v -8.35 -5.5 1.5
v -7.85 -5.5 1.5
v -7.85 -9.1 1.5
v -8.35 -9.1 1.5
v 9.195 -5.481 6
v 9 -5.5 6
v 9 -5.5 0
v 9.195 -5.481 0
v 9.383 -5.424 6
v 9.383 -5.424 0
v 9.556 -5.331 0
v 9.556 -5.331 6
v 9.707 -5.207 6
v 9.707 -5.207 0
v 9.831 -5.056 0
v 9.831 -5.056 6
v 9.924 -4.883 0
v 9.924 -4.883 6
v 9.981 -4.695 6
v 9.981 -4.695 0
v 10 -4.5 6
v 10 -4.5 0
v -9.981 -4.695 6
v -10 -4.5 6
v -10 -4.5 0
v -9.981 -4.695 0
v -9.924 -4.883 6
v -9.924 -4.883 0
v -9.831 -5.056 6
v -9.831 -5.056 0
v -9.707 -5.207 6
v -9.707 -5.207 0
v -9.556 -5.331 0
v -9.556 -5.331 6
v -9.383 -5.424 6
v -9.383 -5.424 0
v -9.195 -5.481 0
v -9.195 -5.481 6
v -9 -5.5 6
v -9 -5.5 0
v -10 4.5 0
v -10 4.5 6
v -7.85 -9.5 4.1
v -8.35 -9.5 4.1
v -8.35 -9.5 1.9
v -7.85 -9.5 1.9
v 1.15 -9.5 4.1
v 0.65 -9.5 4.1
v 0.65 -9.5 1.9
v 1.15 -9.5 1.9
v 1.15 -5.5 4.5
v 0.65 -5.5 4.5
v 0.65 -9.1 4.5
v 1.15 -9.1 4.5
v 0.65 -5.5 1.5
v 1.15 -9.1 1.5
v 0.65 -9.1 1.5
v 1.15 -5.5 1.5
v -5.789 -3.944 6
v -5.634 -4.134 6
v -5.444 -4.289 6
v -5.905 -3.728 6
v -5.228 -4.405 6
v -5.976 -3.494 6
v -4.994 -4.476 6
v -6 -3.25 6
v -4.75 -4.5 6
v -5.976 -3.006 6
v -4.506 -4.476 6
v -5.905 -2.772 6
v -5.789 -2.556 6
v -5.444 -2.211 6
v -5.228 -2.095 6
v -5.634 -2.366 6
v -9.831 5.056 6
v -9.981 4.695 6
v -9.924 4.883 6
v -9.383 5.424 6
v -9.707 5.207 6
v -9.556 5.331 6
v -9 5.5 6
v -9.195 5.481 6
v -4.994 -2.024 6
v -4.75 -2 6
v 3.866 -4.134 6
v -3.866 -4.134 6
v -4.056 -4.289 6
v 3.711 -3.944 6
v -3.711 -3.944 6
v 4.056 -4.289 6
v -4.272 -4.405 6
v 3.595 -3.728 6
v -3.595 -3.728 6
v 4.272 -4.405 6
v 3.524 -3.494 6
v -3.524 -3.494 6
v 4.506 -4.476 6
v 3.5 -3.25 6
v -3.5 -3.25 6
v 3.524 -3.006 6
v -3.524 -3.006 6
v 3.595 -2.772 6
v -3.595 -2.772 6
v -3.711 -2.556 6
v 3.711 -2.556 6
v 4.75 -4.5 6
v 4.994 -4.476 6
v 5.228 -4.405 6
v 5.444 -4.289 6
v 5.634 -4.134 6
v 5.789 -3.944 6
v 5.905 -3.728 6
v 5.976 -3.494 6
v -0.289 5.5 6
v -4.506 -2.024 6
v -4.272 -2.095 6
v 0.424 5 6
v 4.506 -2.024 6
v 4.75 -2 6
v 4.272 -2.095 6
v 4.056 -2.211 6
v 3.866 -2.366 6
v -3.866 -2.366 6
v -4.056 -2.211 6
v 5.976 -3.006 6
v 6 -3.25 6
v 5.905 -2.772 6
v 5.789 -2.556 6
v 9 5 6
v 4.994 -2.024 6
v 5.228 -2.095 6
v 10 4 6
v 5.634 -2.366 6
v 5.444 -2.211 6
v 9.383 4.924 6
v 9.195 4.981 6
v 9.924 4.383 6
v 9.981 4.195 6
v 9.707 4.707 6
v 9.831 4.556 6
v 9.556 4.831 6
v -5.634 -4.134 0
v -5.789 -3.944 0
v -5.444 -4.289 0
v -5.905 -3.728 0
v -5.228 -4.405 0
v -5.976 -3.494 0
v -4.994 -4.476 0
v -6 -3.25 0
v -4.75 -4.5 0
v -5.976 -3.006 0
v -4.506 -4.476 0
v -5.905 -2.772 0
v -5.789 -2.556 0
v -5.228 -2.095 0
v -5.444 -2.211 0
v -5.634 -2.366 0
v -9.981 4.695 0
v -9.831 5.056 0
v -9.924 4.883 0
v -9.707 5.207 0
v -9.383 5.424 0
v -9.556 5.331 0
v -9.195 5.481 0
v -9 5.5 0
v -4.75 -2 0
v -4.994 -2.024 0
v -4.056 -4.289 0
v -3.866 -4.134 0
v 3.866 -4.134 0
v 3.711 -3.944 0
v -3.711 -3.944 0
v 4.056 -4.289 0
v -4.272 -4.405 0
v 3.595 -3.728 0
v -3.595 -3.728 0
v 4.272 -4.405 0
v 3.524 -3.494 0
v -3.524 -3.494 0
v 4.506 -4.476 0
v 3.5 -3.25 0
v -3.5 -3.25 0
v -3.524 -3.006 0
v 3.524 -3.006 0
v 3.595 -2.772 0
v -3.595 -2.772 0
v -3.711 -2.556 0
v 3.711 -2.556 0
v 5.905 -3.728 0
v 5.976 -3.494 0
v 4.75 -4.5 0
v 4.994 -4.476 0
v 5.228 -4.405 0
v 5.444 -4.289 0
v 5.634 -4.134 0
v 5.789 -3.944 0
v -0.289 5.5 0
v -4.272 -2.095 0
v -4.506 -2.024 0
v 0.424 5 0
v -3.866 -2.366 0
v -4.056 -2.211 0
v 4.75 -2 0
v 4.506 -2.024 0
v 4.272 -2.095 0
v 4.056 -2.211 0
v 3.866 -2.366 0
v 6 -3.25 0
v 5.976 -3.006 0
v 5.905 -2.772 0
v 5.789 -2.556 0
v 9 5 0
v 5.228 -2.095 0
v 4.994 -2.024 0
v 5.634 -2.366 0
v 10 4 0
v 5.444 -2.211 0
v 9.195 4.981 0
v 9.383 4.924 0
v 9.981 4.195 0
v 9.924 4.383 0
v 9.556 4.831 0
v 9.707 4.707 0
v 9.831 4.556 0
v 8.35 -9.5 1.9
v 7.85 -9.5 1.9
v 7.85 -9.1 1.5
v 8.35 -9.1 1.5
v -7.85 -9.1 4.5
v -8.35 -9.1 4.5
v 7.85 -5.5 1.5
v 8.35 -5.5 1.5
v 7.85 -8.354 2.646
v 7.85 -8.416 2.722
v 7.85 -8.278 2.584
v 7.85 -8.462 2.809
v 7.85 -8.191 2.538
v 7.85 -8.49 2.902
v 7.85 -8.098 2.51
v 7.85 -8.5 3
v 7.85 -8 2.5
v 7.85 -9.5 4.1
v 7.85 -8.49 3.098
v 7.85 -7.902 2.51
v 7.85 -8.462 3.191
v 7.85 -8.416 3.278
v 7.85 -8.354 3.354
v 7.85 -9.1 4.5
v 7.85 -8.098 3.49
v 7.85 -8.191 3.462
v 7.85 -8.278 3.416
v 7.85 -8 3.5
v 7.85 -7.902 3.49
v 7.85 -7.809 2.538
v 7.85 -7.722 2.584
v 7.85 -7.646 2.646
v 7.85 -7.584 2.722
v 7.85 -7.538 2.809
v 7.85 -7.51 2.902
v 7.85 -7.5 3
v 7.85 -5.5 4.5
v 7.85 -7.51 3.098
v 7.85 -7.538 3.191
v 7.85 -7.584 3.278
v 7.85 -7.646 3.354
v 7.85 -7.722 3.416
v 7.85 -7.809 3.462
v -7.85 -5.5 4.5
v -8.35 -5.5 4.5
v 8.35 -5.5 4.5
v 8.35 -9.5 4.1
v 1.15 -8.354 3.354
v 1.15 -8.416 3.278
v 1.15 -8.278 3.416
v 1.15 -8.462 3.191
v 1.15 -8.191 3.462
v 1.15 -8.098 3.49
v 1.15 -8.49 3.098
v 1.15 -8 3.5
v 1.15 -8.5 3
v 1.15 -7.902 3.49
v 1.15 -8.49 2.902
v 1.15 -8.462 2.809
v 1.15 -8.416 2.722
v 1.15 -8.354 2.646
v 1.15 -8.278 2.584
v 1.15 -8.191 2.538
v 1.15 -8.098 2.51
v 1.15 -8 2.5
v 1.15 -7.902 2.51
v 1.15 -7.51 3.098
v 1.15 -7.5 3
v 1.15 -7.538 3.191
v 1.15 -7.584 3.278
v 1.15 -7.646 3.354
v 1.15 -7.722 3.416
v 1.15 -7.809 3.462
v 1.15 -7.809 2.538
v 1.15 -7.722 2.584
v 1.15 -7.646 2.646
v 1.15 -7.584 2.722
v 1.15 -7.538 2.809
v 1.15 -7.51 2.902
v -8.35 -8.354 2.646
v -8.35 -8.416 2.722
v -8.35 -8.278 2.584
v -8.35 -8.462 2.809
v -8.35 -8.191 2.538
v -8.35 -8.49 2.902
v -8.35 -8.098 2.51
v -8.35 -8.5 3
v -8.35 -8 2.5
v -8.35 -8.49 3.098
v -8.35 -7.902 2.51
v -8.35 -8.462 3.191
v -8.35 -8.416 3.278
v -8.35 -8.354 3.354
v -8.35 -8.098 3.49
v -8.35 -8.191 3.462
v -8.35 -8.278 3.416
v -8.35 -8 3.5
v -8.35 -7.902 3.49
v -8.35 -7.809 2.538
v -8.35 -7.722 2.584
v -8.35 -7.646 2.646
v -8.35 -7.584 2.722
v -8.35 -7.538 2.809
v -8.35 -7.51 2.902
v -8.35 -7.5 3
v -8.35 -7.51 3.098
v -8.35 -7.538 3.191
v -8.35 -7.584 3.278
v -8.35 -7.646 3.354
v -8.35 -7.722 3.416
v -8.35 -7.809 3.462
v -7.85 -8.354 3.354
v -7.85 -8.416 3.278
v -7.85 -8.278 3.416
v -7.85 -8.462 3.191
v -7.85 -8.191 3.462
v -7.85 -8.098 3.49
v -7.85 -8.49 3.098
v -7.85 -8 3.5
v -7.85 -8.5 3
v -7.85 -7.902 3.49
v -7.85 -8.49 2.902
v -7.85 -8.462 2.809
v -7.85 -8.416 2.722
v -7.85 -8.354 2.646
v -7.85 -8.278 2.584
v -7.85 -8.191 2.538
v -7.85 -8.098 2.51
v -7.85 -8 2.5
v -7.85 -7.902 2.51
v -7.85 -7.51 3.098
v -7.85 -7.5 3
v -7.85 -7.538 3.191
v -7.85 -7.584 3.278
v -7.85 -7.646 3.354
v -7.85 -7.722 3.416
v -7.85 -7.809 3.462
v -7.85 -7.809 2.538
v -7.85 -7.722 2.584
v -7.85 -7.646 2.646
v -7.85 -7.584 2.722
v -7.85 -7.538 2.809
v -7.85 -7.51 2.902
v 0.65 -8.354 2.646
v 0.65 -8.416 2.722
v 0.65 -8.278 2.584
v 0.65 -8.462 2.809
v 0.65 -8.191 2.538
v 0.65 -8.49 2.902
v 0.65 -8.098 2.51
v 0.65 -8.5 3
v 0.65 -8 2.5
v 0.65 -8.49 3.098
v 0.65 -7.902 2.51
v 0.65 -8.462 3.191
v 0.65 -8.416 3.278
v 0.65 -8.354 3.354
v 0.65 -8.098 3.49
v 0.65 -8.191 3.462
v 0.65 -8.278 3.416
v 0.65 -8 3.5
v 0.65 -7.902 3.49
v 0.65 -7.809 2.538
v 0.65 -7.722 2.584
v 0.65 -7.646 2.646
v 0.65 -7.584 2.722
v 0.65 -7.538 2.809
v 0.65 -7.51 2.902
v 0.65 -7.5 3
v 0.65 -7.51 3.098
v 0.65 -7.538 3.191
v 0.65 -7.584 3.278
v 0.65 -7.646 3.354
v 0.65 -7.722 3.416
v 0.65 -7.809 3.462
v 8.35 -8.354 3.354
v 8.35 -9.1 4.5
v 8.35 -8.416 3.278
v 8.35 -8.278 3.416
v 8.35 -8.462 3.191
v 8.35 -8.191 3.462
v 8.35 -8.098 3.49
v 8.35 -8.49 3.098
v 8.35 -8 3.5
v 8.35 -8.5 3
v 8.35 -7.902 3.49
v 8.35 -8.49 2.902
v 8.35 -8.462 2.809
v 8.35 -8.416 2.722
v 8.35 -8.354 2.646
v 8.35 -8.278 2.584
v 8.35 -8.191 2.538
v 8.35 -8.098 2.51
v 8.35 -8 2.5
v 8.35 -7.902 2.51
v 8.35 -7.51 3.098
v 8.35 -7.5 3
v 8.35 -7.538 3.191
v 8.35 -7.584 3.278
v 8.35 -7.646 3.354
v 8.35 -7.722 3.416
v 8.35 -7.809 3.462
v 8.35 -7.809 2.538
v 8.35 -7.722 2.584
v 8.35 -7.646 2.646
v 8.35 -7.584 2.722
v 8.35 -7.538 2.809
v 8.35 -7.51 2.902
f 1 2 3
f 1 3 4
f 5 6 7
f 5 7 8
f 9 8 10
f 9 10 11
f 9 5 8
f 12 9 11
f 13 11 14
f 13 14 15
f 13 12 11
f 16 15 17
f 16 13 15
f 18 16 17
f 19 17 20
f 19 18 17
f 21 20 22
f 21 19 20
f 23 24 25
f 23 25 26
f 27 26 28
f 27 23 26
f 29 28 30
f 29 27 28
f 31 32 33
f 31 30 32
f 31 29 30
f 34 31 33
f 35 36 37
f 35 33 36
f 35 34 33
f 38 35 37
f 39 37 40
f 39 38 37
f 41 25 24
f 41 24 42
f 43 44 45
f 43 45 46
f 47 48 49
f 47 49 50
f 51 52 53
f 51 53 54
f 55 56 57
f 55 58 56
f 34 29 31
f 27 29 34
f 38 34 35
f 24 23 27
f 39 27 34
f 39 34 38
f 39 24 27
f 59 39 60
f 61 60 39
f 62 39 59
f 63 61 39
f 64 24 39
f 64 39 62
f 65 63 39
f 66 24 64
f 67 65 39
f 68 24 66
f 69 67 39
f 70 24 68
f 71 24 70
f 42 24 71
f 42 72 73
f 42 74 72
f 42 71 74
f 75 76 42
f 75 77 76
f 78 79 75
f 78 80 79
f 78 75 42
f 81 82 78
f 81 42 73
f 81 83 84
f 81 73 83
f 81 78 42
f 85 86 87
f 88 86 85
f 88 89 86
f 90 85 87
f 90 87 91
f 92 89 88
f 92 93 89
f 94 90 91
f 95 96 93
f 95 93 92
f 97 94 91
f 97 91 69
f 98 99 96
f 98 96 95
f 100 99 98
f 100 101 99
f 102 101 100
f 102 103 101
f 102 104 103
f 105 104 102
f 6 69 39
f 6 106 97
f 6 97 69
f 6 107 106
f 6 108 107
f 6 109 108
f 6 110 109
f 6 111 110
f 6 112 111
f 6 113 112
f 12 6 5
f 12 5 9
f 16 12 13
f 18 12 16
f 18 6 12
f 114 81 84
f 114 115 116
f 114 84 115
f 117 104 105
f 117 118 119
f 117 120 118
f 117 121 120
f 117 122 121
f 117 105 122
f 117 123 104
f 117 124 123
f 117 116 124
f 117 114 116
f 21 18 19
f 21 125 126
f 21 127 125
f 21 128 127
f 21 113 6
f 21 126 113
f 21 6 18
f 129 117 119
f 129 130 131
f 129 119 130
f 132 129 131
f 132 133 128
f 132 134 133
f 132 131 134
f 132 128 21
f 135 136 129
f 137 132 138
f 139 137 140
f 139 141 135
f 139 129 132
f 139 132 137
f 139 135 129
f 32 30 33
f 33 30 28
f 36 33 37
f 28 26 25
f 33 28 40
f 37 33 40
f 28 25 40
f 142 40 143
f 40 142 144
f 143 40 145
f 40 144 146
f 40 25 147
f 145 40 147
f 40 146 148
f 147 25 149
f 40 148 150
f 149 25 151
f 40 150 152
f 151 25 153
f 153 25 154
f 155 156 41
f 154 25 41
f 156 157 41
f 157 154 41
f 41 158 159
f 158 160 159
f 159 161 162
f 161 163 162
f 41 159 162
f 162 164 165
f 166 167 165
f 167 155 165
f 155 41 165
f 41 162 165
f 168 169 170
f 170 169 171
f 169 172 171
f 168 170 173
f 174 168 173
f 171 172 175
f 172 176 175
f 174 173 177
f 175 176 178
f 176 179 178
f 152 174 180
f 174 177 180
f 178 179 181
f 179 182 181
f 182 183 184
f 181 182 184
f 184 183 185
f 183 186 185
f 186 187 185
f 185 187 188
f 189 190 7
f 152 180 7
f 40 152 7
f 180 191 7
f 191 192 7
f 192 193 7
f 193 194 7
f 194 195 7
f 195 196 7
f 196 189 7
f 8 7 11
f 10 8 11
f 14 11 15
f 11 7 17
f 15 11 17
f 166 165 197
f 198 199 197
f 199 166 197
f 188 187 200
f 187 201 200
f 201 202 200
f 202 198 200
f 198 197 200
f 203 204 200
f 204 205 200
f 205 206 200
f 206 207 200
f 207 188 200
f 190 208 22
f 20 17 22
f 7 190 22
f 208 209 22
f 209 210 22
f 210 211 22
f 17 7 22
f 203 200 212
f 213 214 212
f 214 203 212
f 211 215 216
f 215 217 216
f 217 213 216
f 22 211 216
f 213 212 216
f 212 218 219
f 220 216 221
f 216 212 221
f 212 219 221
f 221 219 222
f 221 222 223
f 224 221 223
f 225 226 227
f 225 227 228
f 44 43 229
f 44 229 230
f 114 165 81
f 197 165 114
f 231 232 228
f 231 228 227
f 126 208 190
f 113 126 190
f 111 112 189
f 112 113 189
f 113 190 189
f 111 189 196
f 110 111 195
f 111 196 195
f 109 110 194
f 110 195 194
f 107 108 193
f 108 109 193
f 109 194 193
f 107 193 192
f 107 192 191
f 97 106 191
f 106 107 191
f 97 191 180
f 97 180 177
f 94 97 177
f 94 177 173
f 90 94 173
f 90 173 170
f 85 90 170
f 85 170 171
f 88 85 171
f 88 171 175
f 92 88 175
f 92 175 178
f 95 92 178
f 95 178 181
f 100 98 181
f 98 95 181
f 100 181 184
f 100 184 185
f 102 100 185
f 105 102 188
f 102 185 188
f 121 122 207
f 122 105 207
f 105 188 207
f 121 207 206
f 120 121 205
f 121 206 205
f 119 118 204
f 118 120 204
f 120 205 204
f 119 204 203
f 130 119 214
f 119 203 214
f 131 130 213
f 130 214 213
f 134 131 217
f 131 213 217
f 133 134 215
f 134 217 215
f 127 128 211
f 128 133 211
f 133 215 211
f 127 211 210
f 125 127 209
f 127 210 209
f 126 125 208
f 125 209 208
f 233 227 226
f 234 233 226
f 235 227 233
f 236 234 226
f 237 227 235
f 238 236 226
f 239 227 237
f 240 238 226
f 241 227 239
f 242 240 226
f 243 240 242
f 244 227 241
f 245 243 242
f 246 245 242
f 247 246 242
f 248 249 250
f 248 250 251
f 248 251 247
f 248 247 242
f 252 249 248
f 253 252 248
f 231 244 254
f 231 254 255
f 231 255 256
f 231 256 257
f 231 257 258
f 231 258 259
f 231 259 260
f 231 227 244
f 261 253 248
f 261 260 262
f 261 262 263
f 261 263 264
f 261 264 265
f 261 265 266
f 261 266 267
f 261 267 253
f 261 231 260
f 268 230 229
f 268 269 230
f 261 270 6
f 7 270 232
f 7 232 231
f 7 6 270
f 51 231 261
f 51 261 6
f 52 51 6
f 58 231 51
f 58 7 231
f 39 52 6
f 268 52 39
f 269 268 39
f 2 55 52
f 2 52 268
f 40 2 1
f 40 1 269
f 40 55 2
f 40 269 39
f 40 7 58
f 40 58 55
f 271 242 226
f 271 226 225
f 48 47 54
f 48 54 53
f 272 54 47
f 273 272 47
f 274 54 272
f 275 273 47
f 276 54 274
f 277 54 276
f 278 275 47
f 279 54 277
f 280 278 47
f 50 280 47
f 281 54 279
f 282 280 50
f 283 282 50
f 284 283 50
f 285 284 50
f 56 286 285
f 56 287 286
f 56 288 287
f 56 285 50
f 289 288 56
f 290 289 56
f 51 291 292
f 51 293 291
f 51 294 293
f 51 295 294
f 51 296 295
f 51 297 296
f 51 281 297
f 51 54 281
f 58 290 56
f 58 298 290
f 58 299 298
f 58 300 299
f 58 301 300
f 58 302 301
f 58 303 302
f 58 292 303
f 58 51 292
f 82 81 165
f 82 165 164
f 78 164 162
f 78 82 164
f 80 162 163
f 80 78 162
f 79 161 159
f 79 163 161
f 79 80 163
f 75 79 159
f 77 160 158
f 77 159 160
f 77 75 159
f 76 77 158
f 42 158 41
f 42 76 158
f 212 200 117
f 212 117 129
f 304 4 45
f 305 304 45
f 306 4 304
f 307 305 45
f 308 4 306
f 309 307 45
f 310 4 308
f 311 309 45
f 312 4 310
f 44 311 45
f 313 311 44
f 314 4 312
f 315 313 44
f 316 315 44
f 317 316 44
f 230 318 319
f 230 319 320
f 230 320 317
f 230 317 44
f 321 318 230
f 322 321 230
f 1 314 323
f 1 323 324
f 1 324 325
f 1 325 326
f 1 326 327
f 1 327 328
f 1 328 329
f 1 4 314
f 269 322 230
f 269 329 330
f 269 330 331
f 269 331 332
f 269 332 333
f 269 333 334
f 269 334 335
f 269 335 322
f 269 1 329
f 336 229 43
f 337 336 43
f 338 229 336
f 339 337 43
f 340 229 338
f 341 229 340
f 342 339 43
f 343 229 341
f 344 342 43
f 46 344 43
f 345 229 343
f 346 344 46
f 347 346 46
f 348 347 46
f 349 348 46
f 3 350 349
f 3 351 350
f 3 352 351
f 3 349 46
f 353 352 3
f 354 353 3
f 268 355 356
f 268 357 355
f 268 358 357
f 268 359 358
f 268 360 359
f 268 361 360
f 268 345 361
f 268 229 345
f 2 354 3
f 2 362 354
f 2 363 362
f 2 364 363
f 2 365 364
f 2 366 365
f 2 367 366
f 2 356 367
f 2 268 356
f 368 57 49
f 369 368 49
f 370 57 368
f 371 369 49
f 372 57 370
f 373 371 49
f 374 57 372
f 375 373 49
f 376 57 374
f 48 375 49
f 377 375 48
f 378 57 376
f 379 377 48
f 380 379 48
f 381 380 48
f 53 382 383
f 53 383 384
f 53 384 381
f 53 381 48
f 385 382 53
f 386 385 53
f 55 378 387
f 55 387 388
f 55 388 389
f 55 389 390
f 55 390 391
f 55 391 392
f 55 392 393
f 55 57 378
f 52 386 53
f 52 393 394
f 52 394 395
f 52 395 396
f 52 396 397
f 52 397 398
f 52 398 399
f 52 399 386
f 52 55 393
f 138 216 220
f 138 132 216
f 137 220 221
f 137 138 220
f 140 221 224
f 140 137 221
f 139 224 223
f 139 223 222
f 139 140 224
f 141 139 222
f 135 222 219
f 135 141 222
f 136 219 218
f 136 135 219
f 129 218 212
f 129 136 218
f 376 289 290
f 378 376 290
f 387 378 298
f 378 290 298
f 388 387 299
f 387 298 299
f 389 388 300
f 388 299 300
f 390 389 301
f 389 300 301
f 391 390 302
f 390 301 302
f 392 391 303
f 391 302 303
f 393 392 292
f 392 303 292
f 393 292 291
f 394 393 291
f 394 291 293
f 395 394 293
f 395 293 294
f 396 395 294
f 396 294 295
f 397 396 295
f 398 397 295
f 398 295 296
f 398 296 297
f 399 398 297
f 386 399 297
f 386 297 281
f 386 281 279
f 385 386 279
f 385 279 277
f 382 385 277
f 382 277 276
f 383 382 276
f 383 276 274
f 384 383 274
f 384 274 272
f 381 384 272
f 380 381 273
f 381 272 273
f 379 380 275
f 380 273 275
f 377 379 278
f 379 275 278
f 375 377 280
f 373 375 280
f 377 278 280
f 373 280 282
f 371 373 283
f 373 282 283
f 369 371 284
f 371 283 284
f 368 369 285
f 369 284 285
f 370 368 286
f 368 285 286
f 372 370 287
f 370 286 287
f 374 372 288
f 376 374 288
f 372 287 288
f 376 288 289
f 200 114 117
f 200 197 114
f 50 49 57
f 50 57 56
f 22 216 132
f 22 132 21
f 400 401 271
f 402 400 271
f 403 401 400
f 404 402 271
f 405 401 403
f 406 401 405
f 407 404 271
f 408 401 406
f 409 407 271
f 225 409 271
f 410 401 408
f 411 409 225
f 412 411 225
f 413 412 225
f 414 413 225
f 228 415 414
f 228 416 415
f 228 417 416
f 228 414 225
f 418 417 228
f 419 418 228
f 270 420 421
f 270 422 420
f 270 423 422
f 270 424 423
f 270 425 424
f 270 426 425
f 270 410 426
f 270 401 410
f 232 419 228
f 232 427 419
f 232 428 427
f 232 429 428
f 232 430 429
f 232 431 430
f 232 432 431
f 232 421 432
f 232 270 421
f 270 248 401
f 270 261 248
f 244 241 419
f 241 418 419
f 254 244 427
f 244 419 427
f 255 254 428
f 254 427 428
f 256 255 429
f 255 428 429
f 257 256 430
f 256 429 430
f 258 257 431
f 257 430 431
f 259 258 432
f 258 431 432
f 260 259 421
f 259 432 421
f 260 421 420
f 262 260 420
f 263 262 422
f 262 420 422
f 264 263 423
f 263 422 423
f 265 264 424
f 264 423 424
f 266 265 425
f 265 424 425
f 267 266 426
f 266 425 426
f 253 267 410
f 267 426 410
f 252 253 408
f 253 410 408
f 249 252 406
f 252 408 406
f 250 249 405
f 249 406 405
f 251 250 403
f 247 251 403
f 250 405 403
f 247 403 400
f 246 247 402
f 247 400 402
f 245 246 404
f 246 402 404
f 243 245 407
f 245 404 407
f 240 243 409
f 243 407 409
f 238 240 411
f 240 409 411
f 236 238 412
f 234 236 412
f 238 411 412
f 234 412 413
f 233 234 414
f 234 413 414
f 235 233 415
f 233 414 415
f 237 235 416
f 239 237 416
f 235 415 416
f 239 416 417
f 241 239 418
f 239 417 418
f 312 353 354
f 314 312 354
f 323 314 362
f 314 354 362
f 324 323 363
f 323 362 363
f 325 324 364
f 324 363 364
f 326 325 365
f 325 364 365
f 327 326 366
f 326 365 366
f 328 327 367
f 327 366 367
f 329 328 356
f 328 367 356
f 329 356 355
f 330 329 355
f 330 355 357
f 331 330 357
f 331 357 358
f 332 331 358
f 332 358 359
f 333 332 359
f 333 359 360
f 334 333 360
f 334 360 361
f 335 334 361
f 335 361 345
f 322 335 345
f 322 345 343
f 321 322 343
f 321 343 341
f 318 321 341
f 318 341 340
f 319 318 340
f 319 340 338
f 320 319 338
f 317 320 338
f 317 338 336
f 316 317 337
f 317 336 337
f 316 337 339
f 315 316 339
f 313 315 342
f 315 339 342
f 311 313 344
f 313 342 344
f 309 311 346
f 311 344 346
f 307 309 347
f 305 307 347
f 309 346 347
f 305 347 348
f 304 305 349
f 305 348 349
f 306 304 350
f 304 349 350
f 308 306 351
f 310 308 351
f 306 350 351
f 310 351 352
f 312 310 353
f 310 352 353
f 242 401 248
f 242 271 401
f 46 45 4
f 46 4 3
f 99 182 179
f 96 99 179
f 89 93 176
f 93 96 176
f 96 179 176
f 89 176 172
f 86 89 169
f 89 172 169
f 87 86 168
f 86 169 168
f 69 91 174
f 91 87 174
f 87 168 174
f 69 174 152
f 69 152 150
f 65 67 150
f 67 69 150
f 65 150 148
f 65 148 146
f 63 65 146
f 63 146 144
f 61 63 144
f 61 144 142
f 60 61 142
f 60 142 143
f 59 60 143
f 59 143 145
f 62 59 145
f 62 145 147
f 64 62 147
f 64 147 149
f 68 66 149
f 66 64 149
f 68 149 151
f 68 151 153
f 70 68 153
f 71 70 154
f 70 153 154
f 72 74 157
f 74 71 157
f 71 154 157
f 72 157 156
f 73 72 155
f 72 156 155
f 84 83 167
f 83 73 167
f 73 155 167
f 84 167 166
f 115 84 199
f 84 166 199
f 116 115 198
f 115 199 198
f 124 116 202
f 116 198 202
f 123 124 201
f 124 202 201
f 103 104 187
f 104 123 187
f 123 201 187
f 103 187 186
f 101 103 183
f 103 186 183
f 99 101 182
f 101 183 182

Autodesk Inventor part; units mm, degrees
ref_plane "YZ Plane" through (0, 0, 0) normal (1, 0, 0) x (0, 1, 0)
ref_plane "XZ Plane" through (0, 0, 0) normal (0, 1, 0) x (-1, 0, 0)
ref_plane "XY Plane" through (0, 0, 0) normal (0, 0, 1) x (1, 0, 0)
sketch "Sketch1" plane through (0, 0, 0) normal (0, 0, 1) x (1, 0, 0)
  line L0 (-10, 5.5) -> (-0.289, 5.5)
  line L1 (10, 5) -> (10, -5.5)
  line L2 (10, -5.5) -> (-10, -5.5)
  line L3 (-10, -5.5) -> (-10, 5.5)
  line L4 (-0.289, 5.5) -> (0.4244, 5)
  line L5 (0.4244, 5) -> (10, 5)
  line L6 (-10, 5.5) -> (10, -5.5) construction
  circle A0 centre (4.75, -3.25) radius 1.25
  line L7 (0, -5.5) -> (0, 3.5475) construction
  circle A1 centre (-4.75, -3.25) radius 1.25
  point P0 (0, 0)
  point P1 (0, 0)
  point P2 (0, 0)
  dimension "d3" = 20
  dimension "d4" = 11
  dimension "d5" = 10.5
  dimension "d6" = 0.7134
  dimension "d7" = 2.5
  dimension "d8" = 2.25
  dimension "d9" = 5.25
extrude "Extrusion1" add sketch "Sketch1" along normal blind 6
sketch "Sketch2" plane through (-10, -5.5, 0) normal (0, -1, 0) x (1, 0, 0)
  line L0 (1.65, 4.5) -> (2.15, 4.5)
  line L1 (2.15, 4.5) -> (2.15, 1.5)
  line L2 (2.15, 1.5) -> (1.65, 1.5)
  line L3 (1.65, 1.5) -> (1.65, 4.5)
  line L4 (10.65, 4.5) -> (11.15, 4.5)
  line L5 (11.15, 4.5) -> (11.15, 1.5)
  line L6 (11.15, 1.5) -> (10.65, 1.5)
  line L7 (10.65, 1.5) -> (10.65, 4.5)
  line L8 (17.85, 4.5) -> (18.35, 4.5)
  line L9 (18.35, 4.5) -> (18.35, 1.5)
  line L10 (18.35, 1.5) -> (17.85, 1.5)
  line L11 (17.85, 1.5) -> (17.85, 4.5)
  line L12 (0, 0) -> (0, 6) projected
  line L13 (0, 0) -> (20, 0) projected
  line L14 (0, 6) -> (20, 6) projected
  point P0 (10, 0)
  dimension "d12" = 3
  dimension "d13" = 3
  dimension "d14" = 3
  dimension "d15" = 0.5
  dimension "d16" = 0.5
  dimension "d17" = 0.5
  dimension "d18" = 1.65
  dimension "d19" = 8.5
  dimension "d20" = 6.7
  dimension "d21" = 6
  dimension "d22" = 1.5
extrude "Extrusion2" add sketch "Sketch2" along normal blind 4
sketch "Sketch3" plane through (8.35, -5.5, 4.5) normal (1, 0, 0) x (0, 0, -1)
  circle A0 centre (1.5, -2.5) radius 0.5
  line L0 (3, -4) -> (0, -4) projected
  line L1 (3, 0) -> (3, -4) projected
  line L2 (0, 0) -> (0, -4) projected
  point P0 (4.5, 5.5)
  dimension "d25" = 1
  dimension "d26" = 1.5
  dimension "d27" = 3
  dimension "d28" = 1.5
extrude "Extrusion3" cut sketch "Sketch3" against normal through all
chamfer "Chamfer1" distance 0.4 angle 45 6 edges at (8.1, -9.5, 4.5) (8.1, -9.5, 1.5) (0.9, -9.5, 1.5) (0.9, -9.5, 4.5) (-8.1, -9.5, 4.5) (-8.1, -9.5, 1.5)
fillet "Fillet1" radius 1 4 edges at (10, 5, 3) (10, -5.5, 3) (-10, -5.5, 3) (-10, 5.5, 3)
equation "\"d13\" = d12"
equation "\"d14\" = d13"
equation "\"d22\" = -0.5 * d12 + 0.5 * d21"
equation "\"d28\" = 0.5 * d27"
properties part number "limitSwitch"
